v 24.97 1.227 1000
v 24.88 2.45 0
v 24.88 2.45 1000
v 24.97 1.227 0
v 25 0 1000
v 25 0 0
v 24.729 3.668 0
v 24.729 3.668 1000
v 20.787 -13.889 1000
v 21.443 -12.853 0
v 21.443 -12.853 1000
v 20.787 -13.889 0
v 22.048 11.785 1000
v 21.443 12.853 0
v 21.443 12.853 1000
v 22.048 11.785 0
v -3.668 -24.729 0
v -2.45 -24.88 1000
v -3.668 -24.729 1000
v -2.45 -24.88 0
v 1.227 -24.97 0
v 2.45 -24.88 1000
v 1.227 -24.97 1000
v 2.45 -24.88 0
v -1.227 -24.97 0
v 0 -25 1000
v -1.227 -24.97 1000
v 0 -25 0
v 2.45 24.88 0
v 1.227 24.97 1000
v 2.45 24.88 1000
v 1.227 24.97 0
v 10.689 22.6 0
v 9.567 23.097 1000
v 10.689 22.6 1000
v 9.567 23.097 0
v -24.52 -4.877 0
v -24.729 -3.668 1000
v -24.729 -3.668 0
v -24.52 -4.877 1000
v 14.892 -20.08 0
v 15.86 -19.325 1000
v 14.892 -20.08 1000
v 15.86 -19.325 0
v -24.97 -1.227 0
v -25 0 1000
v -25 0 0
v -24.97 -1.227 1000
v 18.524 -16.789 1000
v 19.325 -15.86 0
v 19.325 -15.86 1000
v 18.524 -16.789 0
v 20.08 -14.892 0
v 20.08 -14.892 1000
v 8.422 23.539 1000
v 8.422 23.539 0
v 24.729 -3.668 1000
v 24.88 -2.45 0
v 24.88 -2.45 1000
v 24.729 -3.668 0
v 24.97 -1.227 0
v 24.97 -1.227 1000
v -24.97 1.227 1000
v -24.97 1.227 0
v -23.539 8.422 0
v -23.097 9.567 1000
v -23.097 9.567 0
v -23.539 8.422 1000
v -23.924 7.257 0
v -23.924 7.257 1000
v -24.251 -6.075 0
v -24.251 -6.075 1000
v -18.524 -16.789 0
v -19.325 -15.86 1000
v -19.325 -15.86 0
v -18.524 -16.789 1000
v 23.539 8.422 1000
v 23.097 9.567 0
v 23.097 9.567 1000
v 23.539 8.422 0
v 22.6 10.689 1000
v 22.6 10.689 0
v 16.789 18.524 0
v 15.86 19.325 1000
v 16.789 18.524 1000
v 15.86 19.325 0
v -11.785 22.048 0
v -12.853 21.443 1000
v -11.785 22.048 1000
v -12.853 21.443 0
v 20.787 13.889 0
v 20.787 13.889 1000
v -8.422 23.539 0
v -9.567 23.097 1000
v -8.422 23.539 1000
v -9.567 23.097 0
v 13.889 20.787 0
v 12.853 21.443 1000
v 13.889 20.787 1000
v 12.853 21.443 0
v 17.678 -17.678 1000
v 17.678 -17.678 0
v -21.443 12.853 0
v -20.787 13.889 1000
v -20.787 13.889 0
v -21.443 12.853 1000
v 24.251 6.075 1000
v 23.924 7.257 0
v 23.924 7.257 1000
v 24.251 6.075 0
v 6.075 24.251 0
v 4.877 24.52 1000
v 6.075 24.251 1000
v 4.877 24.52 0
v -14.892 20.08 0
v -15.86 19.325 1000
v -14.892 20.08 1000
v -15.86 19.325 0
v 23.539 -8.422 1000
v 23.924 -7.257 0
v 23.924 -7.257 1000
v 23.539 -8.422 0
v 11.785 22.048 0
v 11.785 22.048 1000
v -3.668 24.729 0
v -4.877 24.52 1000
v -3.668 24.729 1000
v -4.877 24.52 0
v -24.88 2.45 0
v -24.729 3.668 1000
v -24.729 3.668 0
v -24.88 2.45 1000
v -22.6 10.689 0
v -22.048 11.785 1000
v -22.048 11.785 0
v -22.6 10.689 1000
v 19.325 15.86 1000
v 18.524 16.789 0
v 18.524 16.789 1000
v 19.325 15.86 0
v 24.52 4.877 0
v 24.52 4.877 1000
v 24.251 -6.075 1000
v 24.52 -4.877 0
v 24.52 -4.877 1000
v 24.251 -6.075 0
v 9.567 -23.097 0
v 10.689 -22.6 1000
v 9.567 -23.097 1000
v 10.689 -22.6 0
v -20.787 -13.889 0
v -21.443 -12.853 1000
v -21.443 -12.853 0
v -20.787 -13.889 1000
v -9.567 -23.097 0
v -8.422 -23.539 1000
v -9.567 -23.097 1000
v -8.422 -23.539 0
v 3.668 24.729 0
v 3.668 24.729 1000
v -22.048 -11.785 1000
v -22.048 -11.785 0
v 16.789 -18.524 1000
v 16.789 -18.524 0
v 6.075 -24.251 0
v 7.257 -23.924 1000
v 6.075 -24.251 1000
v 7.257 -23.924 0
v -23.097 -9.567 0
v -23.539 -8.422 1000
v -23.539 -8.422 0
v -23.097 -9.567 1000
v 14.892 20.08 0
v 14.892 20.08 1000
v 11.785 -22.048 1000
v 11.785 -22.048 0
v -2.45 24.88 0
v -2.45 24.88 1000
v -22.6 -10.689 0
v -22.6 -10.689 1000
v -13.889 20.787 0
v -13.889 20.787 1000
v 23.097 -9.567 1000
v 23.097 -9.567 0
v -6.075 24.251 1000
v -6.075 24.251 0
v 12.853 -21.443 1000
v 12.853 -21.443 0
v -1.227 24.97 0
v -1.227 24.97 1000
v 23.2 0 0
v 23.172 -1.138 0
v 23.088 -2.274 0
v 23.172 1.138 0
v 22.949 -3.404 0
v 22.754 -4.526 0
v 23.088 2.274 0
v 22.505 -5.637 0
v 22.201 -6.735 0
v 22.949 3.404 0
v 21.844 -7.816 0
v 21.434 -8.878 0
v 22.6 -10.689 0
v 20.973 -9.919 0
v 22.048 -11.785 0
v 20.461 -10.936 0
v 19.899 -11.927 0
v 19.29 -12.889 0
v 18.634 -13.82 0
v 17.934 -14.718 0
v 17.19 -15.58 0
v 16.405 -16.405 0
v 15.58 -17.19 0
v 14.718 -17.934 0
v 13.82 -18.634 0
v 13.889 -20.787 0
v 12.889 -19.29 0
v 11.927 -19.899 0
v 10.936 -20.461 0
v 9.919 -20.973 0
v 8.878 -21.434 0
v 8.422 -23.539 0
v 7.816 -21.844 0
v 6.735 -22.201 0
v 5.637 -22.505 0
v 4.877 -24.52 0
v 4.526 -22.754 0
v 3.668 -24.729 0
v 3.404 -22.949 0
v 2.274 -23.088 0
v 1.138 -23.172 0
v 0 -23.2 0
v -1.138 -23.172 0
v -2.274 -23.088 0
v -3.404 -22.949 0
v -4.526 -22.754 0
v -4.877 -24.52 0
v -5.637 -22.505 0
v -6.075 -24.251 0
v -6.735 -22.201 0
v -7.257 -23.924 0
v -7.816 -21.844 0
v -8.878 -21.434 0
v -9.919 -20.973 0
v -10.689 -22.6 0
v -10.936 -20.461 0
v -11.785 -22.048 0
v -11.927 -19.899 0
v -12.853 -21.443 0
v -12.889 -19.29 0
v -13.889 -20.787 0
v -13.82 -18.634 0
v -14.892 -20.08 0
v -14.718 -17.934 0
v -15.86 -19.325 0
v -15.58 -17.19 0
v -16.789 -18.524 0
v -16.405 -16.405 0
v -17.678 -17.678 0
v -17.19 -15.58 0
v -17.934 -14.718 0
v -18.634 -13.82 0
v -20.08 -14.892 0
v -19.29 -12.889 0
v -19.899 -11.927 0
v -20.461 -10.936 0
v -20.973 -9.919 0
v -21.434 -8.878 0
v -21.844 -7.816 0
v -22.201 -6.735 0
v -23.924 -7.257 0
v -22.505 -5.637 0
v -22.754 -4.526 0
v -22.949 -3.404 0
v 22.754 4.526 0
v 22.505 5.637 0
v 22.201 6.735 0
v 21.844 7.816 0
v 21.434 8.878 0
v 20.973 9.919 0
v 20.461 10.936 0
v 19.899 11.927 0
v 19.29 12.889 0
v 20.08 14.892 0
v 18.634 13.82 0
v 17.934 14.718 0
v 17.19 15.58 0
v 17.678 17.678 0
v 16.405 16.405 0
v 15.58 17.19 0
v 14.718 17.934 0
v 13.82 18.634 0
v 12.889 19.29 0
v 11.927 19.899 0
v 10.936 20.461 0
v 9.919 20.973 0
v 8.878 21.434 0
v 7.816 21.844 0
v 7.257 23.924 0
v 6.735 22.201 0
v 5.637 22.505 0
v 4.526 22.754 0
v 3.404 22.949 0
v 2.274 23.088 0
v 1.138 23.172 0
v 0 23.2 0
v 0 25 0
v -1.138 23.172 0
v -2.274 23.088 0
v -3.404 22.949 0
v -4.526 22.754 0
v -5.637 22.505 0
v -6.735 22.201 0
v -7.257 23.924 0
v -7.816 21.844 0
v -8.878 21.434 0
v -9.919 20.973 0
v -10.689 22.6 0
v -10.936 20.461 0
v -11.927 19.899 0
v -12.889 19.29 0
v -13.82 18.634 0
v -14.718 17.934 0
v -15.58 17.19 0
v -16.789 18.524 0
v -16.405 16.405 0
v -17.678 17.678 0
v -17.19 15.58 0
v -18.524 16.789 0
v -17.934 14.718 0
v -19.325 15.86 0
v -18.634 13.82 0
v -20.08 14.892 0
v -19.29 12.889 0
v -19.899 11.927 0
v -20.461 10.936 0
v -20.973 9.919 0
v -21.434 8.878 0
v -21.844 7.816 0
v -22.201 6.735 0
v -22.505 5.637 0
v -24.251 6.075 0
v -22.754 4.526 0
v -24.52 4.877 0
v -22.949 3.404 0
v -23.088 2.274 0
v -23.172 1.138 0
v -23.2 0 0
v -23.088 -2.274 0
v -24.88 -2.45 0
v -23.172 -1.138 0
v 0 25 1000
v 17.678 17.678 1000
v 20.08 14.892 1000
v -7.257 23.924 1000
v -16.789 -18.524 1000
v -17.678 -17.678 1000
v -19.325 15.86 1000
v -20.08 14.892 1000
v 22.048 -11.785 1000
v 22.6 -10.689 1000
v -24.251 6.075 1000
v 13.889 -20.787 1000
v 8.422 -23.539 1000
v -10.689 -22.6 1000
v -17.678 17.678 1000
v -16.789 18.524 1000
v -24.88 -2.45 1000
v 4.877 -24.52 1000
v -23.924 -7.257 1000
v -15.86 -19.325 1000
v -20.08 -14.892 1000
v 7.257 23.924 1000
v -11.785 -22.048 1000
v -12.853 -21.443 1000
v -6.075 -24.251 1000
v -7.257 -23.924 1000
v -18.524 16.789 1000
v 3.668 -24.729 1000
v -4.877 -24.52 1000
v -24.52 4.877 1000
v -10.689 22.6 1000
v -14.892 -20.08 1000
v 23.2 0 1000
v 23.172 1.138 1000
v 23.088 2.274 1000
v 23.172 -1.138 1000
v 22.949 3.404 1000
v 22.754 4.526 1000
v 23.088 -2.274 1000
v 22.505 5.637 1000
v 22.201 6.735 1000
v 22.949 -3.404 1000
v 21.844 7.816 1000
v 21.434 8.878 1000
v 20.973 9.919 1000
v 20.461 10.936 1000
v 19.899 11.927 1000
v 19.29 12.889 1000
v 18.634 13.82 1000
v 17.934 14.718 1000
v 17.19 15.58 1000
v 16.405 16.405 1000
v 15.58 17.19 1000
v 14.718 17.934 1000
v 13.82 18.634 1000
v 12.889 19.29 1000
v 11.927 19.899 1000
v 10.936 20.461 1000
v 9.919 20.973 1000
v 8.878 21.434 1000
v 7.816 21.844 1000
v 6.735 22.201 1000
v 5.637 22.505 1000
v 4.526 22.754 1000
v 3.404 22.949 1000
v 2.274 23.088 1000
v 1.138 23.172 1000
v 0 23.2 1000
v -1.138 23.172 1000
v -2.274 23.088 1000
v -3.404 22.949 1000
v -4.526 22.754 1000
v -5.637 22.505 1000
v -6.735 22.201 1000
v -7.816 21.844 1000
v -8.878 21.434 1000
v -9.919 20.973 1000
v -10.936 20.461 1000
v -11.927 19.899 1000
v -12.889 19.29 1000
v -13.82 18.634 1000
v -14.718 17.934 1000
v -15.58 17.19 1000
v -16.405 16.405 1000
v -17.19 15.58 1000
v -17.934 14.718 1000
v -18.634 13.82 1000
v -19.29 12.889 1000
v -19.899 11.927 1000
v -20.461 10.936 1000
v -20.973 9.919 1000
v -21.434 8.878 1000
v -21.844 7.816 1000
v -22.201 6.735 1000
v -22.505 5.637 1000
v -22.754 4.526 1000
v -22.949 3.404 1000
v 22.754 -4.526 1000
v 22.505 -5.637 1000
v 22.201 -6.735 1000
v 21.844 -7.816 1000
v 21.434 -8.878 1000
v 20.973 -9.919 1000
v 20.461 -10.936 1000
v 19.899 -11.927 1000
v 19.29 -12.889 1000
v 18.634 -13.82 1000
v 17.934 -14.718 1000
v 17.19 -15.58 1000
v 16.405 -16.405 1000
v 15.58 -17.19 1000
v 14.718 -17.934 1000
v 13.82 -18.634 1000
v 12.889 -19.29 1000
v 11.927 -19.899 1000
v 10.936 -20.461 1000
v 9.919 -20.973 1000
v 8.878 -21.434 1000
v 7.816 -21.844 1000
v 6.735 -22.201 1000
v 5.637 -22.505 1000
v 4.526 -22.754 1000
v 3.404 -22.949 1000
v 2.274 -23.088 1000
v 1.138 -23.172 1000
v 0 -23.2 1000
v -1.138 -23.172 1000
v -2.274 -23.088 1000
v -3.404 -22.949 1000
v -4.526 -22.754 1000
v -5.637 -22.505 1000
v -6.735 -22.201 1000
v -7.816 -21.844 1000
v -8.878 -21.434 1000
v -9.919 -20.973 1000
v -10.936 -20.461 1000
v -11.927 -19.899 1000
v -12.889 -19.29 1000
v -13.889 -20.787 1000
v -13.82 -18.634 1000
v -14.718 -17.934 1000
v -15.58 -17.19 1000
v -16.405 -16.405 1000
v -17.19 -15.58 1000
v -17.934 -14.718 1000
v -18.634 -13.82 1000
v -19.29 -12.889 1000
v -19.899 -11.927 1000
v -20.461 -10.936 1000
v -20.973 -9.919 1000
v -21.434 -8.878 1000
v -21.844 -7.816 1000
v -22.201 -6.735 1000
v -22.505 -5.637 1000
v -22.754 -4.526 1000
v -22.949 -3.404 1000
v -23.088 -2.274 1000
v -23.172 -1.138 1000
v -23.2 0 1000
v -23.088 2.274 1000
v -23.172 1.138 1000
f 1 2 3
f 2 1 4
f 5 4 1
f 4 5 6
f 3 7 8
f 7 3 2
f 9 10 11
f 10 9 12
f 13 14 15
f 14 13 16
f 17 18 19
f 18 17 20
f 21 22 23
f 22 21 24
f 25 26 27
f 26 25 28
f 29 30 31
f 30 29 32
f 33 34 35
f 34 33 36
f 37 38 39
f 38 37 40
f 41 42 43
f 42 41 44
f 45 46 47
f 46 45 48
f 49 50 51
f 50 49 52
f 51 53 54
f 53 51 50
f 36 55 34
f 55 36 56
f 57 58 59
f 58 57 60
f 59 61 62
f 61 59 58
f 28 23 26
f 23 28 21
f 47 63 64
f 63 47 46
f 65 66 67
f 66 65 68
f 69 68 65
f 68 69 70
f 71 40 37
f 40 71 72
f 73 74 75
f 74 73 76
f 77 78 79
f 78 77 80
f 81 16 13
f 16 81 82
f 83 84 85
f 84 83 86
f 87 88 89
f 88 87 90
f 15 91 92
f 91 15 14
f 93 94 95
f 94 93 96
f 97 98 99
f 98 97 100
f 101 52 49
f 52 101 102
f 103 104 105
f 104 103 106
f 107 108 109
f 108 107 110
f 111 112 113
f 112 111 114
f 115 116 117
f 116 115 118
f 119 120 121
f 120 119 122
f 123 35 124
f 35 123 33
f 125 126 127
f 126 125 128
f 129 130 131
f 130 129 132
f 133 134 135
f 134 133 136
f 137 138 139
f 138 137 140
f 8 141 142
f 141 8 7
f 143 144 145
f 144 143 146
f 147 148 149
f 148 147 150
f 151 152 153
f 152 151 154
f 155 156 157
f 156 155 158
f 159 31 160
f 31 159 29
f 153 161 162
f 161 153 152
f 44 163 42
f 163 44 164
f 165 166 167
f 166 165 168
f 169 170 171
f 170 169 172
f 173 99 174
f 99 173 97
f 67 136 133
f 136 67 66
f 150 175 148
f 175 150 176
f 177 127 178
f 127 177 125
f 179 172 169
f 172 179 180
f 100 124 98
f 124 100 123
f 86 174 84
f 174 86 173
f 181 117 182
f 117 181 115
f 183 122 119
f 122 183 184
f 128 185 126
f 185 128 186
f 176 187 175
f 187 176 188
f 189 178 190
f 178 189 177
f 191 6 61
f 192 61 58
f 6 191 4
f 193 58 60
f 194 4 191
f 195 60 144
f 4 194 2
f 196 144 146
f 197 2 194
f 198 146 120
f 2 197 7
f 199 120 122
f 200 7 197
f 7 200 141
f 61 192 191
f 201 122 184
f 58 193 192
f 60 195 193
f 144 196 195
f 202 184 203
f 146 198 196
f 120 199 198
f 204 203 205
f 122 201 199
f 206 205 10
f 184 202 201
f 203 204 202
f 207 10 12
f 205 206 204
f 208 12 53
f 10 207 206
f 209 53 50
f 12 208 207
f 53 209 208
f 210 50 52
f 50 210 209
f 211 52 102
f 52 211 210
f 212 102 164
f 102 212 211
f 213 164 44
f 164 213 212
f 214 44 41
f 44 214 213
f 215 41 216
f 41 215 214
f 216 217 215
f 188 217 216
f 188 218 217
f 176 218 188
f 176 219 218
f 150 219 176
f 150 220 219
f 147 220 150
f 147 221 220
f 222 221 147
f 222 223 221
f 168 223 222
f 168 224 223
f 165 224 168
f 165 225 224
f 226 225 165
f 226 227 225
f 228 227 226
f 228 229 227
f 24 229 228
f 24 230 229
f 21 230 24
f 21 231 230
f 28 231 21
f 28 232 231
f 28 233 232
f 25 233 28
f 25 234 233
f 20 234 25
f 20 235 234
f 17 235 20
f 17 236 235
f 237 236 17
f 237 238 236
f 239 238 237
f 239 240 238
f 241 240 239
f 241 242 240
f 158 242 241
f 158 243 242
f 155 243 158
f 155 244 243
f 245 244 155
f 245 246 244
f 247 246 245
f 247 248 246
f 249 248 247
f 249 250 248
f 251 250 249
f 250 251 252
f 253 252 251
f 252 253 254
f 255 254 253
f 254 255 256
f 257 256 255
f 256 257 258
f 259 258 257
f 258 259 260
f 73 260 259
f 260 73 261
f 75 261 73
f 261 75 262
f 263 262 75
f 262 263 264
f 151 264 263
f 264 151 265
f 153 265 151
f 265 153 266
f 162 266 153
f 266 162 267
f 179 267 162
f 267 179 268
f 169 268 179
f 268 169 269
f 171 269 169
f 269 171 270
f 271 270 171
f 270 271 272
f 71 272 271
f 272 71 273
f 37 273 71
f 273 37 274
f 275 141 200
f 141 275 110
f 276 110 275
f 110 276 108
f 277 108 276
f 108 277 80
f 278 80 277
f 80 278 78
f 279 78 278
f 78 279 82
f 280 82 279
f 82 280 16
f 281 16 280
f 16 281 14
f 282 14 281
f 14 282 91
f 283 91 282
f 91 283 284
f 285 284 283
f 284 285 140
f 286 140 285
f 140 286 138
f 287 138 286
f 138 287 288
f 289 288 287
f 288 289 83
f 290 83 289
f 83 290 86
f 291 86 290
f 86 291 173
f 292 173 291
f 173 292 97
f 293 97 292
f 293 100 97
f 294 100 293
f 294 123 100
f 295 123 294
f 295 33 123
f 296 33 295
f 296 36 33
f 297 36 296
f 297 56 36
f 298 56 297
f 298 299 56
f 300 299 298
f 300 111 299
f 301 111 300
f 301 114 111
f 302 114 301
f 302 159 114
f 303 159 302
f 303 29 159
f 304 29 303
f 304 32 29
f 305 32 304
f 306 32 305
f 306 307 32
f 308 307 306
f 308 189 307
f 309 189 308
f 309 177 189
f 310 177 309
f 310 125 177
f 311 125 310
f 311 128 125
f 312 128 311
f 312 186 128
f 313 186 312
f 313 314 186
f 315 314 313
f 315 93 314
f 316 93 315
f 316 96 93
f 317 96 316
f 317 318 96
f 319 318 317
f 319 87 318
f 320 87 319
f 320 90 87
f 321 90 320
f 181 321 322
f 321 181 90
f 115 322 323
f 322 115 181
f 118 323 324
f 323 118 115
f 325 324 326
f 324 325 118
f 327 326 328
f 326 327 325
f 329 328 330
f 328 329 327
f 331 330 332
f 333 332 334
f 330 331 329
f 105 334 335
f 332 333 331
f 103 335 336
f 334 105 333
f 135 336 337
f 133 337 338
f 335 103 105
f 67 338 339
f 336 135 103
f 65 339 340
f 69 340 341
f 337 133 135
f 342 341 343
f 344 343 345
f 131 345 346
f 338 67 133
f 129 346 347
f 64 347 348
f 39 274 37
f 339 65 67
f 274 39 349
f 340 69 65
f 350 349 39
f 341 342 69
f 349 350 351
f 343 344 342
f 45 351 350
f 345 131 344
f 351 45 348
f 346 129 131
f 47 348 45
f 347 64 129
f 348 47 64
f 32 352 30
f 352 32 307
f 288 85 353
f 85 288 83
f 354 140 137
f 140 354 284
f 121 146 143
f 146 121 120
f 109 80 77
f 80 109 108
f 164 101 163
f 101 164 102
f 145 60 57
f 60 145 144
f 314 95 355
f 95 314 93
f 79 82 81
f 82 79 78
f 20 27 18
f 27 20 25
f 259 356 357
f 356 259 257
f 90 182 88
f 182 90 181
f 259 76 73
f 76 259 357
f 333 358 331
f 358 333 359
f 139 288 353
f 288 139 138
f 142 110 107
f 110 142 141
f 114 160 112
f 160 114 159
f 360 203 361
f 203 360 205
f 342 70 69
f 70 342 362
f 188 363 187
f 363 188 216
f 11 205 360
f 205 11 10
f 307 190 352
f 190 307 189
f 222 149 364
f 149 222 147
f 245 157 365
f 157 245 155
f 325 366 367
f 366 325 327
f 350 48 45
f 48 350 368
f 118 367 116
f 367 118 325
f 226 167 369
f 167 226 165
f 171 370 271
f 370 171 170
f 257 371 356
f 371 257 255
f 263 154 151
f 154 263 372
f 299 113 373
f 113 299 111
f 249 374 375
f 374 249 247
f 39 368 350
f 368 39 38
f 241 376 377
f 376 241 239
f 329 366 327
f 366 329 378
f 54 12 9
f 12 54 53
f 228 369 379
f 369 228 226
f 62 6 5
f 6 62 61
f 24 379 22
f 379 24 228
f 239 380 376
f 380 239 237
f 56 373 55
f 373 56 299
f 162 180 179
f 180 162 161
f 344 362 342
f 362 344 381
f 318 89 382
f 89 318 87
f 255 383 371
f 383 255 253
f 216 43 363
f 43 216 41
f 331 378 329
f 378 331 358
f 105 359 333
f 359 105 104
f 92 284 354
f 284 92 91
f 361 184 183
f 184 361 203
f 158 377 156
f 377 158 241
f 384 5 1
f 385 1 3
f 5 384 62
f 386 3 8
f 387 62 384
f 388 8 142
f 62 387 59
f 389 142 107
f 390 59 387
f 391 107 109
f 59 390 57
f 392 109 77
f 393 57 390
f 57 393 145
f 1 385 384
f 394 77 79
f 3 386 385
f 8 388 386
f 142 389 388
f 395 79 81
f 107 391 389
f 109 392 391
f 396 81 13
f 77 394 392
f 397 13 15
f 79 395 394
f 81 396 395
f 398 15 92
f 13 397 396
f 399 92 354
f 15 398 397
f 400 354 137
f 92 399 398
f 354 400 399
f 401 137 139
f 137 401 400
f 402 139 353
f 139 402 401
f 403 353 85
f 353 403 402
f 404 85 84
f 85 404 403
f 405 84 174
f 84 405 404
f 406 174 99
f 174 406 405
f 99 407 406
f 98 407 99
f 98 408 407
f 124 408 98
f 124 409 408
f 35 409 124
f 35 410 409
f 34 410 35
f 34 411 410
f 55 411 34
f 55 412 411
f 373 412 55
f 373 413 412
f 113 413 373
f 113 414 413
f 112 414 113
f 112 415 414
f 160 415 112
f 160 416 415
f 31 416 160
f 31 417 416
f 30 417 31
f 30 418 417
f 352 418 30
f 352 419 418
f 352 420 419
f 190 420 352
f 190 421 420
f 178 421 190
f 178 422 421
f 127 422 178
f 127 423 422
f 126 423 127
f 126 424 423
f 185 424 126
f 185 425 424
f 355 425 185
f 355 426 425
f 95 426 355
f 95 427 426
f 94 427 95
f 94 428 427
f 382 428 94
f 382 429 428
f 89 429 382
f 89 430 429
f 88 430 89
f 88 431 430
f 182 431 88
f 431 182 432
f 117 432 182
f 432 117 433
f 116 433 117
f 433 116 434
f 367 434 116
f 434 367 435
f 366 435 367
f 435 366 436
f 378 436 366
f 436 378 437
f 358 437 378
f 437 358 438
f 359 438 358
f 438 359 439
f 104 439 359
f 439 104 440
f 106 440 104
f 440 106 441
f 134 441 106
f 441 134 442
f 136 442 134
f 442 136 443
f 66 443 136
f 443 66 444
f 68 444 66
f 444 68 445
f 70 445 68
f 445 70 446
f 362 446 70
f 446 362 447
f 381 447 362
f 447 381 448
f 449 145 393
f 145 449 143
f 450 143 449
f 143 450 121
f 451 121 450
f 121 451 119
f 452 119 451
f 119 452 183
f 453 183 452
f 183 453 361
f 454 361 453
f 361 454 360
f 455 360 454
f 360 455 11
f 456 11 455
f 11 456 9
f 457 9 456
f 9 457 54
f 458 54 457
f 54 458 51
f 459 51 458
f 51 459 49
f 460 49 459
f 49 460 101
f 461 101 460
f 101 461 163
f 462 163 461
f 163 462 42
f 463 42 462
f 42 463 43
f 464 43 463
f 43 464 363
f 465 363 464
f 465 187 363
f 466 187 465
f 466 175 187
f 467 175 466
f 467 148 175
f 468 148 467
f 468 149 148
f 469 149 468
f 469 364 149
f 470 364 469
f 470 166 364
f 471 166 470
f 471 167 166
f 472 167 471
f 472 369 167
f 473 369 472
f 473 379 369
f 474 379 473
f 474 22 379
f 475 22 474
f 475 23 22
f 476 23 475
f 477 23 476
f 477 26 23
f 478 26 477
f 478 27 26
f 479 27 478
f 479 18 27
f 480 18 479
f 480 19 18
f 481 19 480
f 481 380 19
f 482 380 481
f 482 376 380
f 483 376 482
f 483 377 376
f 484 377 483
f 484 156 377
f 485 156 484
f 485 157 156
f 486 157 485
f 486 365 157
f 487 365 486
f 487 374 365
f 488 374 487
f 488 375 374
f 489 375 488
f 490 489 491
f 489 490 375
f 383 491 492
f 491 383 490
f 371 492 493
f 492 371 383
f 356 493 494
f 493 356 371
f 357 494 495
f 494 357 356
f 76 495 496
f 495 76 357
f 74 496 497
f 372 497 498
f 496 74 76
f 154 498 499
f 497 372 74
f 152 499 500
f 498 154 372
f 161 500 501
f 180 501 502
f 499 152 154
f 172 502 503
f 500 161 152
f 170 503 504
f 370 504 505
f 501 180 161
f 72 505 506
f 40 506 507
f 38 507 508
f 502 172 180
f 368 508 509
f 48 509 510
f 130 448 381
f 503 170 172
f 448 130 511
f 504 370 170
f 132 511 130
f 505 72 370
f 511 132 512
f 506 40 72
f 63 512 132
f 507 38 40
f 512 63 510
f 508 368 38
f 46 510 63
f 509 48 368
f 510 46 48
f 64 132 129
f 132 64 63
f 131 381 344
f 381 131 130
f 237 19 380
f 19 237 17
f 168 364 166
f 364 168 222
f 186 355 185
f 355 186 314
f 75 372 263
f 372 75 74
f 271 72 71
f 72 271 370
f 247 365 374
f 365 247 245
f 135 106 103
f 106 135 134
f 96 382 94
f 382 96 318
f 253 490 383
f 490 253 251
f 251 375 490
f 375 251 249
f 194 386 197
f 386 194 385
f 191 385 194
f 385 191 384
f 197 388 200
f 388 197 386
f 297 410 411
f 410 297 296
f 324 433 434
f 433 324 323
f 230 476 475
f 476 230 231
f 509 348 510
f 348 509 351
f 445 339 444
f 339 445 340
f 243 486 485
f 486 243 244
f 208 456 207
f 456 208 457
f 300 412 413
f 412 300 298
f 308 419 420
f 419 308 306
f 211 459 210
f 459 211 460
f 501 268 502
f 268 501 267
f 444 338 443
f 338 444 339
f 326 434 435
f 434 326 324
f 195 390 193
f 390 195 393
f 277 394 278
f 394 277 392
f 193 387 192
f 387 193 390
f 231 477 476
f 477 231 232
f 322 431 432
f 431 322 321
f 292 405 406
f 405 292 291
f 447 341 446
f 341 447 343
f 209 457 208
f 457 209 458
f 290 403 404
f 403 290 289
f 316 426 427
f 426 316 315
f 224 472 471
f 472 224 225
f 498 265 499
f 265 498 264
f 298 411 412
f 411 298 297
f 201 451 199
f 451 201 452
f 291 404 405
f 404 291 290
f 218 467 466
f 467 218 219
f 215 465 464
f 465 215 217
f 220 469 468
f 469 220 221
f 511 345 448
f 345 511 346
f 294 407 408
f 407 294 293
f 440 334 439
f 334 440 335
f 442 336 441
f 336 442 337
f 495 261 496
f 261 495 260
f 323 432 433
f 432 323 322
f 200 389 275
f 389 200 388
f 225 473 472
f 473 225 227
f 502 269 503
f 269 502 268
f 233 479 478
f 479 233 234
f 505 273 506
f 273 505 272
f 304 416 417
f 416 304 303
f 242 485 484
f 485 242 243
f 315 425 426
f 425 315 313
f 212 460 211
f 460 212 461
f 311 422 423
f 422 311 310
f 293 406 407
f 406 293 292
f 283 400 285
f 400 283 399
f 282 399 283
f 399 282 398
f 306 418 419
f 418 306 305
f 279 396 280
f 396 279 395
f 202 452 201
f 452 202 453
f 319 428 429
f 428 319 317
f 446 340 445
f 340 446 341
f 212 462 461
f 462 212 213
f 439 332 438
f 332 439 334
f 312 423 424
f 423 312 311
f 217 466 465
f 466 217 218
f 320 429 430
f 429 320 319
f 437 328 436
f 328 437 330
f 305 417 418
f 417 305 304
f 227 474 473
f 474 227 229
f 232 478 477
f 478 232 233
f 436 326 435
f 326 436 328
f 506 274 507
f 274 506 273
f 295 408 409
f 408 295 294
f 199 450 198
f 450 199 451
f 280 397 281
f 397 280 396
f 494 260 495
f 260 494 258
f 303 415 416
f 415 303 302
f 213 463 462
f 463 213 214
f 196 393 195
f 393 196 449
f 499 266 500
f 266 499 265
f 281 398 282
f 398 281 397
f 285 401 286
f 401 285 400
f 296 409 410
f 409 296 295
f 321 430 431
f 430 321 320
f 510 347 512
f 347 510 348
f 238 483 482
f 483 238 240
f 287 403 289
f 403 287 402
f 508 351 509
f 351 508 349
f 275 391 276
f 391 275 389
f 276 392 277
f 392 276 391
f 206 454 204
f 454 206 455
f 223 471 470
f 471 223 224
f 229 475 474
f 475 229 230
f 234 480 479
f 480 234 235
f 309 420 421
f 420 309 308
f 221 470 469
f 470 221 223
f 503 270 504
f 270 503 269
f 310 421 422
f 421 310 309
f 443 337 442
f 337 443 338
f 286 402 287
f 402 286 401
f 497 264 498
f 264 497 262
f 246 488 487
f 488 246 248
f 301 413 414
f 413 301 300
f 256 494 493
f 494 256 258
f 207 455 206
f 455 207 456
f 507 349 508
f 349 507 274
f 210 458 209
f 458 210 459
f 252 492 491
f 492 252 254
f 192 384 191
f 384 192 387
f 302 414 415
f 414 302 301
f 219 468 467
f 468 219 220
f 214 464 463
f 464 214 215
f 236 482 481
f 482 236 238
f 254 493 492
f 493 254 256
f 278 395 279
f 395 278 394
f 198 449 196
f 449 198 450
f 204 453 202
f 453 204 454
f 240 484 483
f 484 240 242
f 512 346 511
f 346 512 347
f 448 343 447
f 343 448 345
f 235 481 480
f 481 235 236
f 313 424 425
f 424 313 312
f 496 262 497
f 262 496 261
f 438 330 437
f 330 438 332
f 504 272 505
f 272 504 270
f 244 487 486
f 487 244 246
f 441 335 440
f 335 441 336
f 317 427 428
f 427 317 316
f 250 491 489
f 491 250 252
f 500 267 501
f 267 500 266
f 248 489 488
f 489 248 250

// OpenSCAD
$fn = 128;

// HT 50 pipe (approx.): DN50, length 1000 mm
// Typical HT dimensions (approx):
// - Outer diameter: 50 mm
// - Wall thickness: 1.8 mm
// - Inner diameter: 46.4 mm
// Adjust as needed.

length = 1000;
od = 50;
wall = 1.8;
id = od - 2*wall;

module ht_pipe(len=length, outer_d=od, inner_d=id) {
    difference() {
        cylinder(h=len, d=outer_d, center=false);
        translate([0,0,-0.1]) cylinder(h=len+0.2, d=inner_d, center=false);
    }
}

ht_pipe();
